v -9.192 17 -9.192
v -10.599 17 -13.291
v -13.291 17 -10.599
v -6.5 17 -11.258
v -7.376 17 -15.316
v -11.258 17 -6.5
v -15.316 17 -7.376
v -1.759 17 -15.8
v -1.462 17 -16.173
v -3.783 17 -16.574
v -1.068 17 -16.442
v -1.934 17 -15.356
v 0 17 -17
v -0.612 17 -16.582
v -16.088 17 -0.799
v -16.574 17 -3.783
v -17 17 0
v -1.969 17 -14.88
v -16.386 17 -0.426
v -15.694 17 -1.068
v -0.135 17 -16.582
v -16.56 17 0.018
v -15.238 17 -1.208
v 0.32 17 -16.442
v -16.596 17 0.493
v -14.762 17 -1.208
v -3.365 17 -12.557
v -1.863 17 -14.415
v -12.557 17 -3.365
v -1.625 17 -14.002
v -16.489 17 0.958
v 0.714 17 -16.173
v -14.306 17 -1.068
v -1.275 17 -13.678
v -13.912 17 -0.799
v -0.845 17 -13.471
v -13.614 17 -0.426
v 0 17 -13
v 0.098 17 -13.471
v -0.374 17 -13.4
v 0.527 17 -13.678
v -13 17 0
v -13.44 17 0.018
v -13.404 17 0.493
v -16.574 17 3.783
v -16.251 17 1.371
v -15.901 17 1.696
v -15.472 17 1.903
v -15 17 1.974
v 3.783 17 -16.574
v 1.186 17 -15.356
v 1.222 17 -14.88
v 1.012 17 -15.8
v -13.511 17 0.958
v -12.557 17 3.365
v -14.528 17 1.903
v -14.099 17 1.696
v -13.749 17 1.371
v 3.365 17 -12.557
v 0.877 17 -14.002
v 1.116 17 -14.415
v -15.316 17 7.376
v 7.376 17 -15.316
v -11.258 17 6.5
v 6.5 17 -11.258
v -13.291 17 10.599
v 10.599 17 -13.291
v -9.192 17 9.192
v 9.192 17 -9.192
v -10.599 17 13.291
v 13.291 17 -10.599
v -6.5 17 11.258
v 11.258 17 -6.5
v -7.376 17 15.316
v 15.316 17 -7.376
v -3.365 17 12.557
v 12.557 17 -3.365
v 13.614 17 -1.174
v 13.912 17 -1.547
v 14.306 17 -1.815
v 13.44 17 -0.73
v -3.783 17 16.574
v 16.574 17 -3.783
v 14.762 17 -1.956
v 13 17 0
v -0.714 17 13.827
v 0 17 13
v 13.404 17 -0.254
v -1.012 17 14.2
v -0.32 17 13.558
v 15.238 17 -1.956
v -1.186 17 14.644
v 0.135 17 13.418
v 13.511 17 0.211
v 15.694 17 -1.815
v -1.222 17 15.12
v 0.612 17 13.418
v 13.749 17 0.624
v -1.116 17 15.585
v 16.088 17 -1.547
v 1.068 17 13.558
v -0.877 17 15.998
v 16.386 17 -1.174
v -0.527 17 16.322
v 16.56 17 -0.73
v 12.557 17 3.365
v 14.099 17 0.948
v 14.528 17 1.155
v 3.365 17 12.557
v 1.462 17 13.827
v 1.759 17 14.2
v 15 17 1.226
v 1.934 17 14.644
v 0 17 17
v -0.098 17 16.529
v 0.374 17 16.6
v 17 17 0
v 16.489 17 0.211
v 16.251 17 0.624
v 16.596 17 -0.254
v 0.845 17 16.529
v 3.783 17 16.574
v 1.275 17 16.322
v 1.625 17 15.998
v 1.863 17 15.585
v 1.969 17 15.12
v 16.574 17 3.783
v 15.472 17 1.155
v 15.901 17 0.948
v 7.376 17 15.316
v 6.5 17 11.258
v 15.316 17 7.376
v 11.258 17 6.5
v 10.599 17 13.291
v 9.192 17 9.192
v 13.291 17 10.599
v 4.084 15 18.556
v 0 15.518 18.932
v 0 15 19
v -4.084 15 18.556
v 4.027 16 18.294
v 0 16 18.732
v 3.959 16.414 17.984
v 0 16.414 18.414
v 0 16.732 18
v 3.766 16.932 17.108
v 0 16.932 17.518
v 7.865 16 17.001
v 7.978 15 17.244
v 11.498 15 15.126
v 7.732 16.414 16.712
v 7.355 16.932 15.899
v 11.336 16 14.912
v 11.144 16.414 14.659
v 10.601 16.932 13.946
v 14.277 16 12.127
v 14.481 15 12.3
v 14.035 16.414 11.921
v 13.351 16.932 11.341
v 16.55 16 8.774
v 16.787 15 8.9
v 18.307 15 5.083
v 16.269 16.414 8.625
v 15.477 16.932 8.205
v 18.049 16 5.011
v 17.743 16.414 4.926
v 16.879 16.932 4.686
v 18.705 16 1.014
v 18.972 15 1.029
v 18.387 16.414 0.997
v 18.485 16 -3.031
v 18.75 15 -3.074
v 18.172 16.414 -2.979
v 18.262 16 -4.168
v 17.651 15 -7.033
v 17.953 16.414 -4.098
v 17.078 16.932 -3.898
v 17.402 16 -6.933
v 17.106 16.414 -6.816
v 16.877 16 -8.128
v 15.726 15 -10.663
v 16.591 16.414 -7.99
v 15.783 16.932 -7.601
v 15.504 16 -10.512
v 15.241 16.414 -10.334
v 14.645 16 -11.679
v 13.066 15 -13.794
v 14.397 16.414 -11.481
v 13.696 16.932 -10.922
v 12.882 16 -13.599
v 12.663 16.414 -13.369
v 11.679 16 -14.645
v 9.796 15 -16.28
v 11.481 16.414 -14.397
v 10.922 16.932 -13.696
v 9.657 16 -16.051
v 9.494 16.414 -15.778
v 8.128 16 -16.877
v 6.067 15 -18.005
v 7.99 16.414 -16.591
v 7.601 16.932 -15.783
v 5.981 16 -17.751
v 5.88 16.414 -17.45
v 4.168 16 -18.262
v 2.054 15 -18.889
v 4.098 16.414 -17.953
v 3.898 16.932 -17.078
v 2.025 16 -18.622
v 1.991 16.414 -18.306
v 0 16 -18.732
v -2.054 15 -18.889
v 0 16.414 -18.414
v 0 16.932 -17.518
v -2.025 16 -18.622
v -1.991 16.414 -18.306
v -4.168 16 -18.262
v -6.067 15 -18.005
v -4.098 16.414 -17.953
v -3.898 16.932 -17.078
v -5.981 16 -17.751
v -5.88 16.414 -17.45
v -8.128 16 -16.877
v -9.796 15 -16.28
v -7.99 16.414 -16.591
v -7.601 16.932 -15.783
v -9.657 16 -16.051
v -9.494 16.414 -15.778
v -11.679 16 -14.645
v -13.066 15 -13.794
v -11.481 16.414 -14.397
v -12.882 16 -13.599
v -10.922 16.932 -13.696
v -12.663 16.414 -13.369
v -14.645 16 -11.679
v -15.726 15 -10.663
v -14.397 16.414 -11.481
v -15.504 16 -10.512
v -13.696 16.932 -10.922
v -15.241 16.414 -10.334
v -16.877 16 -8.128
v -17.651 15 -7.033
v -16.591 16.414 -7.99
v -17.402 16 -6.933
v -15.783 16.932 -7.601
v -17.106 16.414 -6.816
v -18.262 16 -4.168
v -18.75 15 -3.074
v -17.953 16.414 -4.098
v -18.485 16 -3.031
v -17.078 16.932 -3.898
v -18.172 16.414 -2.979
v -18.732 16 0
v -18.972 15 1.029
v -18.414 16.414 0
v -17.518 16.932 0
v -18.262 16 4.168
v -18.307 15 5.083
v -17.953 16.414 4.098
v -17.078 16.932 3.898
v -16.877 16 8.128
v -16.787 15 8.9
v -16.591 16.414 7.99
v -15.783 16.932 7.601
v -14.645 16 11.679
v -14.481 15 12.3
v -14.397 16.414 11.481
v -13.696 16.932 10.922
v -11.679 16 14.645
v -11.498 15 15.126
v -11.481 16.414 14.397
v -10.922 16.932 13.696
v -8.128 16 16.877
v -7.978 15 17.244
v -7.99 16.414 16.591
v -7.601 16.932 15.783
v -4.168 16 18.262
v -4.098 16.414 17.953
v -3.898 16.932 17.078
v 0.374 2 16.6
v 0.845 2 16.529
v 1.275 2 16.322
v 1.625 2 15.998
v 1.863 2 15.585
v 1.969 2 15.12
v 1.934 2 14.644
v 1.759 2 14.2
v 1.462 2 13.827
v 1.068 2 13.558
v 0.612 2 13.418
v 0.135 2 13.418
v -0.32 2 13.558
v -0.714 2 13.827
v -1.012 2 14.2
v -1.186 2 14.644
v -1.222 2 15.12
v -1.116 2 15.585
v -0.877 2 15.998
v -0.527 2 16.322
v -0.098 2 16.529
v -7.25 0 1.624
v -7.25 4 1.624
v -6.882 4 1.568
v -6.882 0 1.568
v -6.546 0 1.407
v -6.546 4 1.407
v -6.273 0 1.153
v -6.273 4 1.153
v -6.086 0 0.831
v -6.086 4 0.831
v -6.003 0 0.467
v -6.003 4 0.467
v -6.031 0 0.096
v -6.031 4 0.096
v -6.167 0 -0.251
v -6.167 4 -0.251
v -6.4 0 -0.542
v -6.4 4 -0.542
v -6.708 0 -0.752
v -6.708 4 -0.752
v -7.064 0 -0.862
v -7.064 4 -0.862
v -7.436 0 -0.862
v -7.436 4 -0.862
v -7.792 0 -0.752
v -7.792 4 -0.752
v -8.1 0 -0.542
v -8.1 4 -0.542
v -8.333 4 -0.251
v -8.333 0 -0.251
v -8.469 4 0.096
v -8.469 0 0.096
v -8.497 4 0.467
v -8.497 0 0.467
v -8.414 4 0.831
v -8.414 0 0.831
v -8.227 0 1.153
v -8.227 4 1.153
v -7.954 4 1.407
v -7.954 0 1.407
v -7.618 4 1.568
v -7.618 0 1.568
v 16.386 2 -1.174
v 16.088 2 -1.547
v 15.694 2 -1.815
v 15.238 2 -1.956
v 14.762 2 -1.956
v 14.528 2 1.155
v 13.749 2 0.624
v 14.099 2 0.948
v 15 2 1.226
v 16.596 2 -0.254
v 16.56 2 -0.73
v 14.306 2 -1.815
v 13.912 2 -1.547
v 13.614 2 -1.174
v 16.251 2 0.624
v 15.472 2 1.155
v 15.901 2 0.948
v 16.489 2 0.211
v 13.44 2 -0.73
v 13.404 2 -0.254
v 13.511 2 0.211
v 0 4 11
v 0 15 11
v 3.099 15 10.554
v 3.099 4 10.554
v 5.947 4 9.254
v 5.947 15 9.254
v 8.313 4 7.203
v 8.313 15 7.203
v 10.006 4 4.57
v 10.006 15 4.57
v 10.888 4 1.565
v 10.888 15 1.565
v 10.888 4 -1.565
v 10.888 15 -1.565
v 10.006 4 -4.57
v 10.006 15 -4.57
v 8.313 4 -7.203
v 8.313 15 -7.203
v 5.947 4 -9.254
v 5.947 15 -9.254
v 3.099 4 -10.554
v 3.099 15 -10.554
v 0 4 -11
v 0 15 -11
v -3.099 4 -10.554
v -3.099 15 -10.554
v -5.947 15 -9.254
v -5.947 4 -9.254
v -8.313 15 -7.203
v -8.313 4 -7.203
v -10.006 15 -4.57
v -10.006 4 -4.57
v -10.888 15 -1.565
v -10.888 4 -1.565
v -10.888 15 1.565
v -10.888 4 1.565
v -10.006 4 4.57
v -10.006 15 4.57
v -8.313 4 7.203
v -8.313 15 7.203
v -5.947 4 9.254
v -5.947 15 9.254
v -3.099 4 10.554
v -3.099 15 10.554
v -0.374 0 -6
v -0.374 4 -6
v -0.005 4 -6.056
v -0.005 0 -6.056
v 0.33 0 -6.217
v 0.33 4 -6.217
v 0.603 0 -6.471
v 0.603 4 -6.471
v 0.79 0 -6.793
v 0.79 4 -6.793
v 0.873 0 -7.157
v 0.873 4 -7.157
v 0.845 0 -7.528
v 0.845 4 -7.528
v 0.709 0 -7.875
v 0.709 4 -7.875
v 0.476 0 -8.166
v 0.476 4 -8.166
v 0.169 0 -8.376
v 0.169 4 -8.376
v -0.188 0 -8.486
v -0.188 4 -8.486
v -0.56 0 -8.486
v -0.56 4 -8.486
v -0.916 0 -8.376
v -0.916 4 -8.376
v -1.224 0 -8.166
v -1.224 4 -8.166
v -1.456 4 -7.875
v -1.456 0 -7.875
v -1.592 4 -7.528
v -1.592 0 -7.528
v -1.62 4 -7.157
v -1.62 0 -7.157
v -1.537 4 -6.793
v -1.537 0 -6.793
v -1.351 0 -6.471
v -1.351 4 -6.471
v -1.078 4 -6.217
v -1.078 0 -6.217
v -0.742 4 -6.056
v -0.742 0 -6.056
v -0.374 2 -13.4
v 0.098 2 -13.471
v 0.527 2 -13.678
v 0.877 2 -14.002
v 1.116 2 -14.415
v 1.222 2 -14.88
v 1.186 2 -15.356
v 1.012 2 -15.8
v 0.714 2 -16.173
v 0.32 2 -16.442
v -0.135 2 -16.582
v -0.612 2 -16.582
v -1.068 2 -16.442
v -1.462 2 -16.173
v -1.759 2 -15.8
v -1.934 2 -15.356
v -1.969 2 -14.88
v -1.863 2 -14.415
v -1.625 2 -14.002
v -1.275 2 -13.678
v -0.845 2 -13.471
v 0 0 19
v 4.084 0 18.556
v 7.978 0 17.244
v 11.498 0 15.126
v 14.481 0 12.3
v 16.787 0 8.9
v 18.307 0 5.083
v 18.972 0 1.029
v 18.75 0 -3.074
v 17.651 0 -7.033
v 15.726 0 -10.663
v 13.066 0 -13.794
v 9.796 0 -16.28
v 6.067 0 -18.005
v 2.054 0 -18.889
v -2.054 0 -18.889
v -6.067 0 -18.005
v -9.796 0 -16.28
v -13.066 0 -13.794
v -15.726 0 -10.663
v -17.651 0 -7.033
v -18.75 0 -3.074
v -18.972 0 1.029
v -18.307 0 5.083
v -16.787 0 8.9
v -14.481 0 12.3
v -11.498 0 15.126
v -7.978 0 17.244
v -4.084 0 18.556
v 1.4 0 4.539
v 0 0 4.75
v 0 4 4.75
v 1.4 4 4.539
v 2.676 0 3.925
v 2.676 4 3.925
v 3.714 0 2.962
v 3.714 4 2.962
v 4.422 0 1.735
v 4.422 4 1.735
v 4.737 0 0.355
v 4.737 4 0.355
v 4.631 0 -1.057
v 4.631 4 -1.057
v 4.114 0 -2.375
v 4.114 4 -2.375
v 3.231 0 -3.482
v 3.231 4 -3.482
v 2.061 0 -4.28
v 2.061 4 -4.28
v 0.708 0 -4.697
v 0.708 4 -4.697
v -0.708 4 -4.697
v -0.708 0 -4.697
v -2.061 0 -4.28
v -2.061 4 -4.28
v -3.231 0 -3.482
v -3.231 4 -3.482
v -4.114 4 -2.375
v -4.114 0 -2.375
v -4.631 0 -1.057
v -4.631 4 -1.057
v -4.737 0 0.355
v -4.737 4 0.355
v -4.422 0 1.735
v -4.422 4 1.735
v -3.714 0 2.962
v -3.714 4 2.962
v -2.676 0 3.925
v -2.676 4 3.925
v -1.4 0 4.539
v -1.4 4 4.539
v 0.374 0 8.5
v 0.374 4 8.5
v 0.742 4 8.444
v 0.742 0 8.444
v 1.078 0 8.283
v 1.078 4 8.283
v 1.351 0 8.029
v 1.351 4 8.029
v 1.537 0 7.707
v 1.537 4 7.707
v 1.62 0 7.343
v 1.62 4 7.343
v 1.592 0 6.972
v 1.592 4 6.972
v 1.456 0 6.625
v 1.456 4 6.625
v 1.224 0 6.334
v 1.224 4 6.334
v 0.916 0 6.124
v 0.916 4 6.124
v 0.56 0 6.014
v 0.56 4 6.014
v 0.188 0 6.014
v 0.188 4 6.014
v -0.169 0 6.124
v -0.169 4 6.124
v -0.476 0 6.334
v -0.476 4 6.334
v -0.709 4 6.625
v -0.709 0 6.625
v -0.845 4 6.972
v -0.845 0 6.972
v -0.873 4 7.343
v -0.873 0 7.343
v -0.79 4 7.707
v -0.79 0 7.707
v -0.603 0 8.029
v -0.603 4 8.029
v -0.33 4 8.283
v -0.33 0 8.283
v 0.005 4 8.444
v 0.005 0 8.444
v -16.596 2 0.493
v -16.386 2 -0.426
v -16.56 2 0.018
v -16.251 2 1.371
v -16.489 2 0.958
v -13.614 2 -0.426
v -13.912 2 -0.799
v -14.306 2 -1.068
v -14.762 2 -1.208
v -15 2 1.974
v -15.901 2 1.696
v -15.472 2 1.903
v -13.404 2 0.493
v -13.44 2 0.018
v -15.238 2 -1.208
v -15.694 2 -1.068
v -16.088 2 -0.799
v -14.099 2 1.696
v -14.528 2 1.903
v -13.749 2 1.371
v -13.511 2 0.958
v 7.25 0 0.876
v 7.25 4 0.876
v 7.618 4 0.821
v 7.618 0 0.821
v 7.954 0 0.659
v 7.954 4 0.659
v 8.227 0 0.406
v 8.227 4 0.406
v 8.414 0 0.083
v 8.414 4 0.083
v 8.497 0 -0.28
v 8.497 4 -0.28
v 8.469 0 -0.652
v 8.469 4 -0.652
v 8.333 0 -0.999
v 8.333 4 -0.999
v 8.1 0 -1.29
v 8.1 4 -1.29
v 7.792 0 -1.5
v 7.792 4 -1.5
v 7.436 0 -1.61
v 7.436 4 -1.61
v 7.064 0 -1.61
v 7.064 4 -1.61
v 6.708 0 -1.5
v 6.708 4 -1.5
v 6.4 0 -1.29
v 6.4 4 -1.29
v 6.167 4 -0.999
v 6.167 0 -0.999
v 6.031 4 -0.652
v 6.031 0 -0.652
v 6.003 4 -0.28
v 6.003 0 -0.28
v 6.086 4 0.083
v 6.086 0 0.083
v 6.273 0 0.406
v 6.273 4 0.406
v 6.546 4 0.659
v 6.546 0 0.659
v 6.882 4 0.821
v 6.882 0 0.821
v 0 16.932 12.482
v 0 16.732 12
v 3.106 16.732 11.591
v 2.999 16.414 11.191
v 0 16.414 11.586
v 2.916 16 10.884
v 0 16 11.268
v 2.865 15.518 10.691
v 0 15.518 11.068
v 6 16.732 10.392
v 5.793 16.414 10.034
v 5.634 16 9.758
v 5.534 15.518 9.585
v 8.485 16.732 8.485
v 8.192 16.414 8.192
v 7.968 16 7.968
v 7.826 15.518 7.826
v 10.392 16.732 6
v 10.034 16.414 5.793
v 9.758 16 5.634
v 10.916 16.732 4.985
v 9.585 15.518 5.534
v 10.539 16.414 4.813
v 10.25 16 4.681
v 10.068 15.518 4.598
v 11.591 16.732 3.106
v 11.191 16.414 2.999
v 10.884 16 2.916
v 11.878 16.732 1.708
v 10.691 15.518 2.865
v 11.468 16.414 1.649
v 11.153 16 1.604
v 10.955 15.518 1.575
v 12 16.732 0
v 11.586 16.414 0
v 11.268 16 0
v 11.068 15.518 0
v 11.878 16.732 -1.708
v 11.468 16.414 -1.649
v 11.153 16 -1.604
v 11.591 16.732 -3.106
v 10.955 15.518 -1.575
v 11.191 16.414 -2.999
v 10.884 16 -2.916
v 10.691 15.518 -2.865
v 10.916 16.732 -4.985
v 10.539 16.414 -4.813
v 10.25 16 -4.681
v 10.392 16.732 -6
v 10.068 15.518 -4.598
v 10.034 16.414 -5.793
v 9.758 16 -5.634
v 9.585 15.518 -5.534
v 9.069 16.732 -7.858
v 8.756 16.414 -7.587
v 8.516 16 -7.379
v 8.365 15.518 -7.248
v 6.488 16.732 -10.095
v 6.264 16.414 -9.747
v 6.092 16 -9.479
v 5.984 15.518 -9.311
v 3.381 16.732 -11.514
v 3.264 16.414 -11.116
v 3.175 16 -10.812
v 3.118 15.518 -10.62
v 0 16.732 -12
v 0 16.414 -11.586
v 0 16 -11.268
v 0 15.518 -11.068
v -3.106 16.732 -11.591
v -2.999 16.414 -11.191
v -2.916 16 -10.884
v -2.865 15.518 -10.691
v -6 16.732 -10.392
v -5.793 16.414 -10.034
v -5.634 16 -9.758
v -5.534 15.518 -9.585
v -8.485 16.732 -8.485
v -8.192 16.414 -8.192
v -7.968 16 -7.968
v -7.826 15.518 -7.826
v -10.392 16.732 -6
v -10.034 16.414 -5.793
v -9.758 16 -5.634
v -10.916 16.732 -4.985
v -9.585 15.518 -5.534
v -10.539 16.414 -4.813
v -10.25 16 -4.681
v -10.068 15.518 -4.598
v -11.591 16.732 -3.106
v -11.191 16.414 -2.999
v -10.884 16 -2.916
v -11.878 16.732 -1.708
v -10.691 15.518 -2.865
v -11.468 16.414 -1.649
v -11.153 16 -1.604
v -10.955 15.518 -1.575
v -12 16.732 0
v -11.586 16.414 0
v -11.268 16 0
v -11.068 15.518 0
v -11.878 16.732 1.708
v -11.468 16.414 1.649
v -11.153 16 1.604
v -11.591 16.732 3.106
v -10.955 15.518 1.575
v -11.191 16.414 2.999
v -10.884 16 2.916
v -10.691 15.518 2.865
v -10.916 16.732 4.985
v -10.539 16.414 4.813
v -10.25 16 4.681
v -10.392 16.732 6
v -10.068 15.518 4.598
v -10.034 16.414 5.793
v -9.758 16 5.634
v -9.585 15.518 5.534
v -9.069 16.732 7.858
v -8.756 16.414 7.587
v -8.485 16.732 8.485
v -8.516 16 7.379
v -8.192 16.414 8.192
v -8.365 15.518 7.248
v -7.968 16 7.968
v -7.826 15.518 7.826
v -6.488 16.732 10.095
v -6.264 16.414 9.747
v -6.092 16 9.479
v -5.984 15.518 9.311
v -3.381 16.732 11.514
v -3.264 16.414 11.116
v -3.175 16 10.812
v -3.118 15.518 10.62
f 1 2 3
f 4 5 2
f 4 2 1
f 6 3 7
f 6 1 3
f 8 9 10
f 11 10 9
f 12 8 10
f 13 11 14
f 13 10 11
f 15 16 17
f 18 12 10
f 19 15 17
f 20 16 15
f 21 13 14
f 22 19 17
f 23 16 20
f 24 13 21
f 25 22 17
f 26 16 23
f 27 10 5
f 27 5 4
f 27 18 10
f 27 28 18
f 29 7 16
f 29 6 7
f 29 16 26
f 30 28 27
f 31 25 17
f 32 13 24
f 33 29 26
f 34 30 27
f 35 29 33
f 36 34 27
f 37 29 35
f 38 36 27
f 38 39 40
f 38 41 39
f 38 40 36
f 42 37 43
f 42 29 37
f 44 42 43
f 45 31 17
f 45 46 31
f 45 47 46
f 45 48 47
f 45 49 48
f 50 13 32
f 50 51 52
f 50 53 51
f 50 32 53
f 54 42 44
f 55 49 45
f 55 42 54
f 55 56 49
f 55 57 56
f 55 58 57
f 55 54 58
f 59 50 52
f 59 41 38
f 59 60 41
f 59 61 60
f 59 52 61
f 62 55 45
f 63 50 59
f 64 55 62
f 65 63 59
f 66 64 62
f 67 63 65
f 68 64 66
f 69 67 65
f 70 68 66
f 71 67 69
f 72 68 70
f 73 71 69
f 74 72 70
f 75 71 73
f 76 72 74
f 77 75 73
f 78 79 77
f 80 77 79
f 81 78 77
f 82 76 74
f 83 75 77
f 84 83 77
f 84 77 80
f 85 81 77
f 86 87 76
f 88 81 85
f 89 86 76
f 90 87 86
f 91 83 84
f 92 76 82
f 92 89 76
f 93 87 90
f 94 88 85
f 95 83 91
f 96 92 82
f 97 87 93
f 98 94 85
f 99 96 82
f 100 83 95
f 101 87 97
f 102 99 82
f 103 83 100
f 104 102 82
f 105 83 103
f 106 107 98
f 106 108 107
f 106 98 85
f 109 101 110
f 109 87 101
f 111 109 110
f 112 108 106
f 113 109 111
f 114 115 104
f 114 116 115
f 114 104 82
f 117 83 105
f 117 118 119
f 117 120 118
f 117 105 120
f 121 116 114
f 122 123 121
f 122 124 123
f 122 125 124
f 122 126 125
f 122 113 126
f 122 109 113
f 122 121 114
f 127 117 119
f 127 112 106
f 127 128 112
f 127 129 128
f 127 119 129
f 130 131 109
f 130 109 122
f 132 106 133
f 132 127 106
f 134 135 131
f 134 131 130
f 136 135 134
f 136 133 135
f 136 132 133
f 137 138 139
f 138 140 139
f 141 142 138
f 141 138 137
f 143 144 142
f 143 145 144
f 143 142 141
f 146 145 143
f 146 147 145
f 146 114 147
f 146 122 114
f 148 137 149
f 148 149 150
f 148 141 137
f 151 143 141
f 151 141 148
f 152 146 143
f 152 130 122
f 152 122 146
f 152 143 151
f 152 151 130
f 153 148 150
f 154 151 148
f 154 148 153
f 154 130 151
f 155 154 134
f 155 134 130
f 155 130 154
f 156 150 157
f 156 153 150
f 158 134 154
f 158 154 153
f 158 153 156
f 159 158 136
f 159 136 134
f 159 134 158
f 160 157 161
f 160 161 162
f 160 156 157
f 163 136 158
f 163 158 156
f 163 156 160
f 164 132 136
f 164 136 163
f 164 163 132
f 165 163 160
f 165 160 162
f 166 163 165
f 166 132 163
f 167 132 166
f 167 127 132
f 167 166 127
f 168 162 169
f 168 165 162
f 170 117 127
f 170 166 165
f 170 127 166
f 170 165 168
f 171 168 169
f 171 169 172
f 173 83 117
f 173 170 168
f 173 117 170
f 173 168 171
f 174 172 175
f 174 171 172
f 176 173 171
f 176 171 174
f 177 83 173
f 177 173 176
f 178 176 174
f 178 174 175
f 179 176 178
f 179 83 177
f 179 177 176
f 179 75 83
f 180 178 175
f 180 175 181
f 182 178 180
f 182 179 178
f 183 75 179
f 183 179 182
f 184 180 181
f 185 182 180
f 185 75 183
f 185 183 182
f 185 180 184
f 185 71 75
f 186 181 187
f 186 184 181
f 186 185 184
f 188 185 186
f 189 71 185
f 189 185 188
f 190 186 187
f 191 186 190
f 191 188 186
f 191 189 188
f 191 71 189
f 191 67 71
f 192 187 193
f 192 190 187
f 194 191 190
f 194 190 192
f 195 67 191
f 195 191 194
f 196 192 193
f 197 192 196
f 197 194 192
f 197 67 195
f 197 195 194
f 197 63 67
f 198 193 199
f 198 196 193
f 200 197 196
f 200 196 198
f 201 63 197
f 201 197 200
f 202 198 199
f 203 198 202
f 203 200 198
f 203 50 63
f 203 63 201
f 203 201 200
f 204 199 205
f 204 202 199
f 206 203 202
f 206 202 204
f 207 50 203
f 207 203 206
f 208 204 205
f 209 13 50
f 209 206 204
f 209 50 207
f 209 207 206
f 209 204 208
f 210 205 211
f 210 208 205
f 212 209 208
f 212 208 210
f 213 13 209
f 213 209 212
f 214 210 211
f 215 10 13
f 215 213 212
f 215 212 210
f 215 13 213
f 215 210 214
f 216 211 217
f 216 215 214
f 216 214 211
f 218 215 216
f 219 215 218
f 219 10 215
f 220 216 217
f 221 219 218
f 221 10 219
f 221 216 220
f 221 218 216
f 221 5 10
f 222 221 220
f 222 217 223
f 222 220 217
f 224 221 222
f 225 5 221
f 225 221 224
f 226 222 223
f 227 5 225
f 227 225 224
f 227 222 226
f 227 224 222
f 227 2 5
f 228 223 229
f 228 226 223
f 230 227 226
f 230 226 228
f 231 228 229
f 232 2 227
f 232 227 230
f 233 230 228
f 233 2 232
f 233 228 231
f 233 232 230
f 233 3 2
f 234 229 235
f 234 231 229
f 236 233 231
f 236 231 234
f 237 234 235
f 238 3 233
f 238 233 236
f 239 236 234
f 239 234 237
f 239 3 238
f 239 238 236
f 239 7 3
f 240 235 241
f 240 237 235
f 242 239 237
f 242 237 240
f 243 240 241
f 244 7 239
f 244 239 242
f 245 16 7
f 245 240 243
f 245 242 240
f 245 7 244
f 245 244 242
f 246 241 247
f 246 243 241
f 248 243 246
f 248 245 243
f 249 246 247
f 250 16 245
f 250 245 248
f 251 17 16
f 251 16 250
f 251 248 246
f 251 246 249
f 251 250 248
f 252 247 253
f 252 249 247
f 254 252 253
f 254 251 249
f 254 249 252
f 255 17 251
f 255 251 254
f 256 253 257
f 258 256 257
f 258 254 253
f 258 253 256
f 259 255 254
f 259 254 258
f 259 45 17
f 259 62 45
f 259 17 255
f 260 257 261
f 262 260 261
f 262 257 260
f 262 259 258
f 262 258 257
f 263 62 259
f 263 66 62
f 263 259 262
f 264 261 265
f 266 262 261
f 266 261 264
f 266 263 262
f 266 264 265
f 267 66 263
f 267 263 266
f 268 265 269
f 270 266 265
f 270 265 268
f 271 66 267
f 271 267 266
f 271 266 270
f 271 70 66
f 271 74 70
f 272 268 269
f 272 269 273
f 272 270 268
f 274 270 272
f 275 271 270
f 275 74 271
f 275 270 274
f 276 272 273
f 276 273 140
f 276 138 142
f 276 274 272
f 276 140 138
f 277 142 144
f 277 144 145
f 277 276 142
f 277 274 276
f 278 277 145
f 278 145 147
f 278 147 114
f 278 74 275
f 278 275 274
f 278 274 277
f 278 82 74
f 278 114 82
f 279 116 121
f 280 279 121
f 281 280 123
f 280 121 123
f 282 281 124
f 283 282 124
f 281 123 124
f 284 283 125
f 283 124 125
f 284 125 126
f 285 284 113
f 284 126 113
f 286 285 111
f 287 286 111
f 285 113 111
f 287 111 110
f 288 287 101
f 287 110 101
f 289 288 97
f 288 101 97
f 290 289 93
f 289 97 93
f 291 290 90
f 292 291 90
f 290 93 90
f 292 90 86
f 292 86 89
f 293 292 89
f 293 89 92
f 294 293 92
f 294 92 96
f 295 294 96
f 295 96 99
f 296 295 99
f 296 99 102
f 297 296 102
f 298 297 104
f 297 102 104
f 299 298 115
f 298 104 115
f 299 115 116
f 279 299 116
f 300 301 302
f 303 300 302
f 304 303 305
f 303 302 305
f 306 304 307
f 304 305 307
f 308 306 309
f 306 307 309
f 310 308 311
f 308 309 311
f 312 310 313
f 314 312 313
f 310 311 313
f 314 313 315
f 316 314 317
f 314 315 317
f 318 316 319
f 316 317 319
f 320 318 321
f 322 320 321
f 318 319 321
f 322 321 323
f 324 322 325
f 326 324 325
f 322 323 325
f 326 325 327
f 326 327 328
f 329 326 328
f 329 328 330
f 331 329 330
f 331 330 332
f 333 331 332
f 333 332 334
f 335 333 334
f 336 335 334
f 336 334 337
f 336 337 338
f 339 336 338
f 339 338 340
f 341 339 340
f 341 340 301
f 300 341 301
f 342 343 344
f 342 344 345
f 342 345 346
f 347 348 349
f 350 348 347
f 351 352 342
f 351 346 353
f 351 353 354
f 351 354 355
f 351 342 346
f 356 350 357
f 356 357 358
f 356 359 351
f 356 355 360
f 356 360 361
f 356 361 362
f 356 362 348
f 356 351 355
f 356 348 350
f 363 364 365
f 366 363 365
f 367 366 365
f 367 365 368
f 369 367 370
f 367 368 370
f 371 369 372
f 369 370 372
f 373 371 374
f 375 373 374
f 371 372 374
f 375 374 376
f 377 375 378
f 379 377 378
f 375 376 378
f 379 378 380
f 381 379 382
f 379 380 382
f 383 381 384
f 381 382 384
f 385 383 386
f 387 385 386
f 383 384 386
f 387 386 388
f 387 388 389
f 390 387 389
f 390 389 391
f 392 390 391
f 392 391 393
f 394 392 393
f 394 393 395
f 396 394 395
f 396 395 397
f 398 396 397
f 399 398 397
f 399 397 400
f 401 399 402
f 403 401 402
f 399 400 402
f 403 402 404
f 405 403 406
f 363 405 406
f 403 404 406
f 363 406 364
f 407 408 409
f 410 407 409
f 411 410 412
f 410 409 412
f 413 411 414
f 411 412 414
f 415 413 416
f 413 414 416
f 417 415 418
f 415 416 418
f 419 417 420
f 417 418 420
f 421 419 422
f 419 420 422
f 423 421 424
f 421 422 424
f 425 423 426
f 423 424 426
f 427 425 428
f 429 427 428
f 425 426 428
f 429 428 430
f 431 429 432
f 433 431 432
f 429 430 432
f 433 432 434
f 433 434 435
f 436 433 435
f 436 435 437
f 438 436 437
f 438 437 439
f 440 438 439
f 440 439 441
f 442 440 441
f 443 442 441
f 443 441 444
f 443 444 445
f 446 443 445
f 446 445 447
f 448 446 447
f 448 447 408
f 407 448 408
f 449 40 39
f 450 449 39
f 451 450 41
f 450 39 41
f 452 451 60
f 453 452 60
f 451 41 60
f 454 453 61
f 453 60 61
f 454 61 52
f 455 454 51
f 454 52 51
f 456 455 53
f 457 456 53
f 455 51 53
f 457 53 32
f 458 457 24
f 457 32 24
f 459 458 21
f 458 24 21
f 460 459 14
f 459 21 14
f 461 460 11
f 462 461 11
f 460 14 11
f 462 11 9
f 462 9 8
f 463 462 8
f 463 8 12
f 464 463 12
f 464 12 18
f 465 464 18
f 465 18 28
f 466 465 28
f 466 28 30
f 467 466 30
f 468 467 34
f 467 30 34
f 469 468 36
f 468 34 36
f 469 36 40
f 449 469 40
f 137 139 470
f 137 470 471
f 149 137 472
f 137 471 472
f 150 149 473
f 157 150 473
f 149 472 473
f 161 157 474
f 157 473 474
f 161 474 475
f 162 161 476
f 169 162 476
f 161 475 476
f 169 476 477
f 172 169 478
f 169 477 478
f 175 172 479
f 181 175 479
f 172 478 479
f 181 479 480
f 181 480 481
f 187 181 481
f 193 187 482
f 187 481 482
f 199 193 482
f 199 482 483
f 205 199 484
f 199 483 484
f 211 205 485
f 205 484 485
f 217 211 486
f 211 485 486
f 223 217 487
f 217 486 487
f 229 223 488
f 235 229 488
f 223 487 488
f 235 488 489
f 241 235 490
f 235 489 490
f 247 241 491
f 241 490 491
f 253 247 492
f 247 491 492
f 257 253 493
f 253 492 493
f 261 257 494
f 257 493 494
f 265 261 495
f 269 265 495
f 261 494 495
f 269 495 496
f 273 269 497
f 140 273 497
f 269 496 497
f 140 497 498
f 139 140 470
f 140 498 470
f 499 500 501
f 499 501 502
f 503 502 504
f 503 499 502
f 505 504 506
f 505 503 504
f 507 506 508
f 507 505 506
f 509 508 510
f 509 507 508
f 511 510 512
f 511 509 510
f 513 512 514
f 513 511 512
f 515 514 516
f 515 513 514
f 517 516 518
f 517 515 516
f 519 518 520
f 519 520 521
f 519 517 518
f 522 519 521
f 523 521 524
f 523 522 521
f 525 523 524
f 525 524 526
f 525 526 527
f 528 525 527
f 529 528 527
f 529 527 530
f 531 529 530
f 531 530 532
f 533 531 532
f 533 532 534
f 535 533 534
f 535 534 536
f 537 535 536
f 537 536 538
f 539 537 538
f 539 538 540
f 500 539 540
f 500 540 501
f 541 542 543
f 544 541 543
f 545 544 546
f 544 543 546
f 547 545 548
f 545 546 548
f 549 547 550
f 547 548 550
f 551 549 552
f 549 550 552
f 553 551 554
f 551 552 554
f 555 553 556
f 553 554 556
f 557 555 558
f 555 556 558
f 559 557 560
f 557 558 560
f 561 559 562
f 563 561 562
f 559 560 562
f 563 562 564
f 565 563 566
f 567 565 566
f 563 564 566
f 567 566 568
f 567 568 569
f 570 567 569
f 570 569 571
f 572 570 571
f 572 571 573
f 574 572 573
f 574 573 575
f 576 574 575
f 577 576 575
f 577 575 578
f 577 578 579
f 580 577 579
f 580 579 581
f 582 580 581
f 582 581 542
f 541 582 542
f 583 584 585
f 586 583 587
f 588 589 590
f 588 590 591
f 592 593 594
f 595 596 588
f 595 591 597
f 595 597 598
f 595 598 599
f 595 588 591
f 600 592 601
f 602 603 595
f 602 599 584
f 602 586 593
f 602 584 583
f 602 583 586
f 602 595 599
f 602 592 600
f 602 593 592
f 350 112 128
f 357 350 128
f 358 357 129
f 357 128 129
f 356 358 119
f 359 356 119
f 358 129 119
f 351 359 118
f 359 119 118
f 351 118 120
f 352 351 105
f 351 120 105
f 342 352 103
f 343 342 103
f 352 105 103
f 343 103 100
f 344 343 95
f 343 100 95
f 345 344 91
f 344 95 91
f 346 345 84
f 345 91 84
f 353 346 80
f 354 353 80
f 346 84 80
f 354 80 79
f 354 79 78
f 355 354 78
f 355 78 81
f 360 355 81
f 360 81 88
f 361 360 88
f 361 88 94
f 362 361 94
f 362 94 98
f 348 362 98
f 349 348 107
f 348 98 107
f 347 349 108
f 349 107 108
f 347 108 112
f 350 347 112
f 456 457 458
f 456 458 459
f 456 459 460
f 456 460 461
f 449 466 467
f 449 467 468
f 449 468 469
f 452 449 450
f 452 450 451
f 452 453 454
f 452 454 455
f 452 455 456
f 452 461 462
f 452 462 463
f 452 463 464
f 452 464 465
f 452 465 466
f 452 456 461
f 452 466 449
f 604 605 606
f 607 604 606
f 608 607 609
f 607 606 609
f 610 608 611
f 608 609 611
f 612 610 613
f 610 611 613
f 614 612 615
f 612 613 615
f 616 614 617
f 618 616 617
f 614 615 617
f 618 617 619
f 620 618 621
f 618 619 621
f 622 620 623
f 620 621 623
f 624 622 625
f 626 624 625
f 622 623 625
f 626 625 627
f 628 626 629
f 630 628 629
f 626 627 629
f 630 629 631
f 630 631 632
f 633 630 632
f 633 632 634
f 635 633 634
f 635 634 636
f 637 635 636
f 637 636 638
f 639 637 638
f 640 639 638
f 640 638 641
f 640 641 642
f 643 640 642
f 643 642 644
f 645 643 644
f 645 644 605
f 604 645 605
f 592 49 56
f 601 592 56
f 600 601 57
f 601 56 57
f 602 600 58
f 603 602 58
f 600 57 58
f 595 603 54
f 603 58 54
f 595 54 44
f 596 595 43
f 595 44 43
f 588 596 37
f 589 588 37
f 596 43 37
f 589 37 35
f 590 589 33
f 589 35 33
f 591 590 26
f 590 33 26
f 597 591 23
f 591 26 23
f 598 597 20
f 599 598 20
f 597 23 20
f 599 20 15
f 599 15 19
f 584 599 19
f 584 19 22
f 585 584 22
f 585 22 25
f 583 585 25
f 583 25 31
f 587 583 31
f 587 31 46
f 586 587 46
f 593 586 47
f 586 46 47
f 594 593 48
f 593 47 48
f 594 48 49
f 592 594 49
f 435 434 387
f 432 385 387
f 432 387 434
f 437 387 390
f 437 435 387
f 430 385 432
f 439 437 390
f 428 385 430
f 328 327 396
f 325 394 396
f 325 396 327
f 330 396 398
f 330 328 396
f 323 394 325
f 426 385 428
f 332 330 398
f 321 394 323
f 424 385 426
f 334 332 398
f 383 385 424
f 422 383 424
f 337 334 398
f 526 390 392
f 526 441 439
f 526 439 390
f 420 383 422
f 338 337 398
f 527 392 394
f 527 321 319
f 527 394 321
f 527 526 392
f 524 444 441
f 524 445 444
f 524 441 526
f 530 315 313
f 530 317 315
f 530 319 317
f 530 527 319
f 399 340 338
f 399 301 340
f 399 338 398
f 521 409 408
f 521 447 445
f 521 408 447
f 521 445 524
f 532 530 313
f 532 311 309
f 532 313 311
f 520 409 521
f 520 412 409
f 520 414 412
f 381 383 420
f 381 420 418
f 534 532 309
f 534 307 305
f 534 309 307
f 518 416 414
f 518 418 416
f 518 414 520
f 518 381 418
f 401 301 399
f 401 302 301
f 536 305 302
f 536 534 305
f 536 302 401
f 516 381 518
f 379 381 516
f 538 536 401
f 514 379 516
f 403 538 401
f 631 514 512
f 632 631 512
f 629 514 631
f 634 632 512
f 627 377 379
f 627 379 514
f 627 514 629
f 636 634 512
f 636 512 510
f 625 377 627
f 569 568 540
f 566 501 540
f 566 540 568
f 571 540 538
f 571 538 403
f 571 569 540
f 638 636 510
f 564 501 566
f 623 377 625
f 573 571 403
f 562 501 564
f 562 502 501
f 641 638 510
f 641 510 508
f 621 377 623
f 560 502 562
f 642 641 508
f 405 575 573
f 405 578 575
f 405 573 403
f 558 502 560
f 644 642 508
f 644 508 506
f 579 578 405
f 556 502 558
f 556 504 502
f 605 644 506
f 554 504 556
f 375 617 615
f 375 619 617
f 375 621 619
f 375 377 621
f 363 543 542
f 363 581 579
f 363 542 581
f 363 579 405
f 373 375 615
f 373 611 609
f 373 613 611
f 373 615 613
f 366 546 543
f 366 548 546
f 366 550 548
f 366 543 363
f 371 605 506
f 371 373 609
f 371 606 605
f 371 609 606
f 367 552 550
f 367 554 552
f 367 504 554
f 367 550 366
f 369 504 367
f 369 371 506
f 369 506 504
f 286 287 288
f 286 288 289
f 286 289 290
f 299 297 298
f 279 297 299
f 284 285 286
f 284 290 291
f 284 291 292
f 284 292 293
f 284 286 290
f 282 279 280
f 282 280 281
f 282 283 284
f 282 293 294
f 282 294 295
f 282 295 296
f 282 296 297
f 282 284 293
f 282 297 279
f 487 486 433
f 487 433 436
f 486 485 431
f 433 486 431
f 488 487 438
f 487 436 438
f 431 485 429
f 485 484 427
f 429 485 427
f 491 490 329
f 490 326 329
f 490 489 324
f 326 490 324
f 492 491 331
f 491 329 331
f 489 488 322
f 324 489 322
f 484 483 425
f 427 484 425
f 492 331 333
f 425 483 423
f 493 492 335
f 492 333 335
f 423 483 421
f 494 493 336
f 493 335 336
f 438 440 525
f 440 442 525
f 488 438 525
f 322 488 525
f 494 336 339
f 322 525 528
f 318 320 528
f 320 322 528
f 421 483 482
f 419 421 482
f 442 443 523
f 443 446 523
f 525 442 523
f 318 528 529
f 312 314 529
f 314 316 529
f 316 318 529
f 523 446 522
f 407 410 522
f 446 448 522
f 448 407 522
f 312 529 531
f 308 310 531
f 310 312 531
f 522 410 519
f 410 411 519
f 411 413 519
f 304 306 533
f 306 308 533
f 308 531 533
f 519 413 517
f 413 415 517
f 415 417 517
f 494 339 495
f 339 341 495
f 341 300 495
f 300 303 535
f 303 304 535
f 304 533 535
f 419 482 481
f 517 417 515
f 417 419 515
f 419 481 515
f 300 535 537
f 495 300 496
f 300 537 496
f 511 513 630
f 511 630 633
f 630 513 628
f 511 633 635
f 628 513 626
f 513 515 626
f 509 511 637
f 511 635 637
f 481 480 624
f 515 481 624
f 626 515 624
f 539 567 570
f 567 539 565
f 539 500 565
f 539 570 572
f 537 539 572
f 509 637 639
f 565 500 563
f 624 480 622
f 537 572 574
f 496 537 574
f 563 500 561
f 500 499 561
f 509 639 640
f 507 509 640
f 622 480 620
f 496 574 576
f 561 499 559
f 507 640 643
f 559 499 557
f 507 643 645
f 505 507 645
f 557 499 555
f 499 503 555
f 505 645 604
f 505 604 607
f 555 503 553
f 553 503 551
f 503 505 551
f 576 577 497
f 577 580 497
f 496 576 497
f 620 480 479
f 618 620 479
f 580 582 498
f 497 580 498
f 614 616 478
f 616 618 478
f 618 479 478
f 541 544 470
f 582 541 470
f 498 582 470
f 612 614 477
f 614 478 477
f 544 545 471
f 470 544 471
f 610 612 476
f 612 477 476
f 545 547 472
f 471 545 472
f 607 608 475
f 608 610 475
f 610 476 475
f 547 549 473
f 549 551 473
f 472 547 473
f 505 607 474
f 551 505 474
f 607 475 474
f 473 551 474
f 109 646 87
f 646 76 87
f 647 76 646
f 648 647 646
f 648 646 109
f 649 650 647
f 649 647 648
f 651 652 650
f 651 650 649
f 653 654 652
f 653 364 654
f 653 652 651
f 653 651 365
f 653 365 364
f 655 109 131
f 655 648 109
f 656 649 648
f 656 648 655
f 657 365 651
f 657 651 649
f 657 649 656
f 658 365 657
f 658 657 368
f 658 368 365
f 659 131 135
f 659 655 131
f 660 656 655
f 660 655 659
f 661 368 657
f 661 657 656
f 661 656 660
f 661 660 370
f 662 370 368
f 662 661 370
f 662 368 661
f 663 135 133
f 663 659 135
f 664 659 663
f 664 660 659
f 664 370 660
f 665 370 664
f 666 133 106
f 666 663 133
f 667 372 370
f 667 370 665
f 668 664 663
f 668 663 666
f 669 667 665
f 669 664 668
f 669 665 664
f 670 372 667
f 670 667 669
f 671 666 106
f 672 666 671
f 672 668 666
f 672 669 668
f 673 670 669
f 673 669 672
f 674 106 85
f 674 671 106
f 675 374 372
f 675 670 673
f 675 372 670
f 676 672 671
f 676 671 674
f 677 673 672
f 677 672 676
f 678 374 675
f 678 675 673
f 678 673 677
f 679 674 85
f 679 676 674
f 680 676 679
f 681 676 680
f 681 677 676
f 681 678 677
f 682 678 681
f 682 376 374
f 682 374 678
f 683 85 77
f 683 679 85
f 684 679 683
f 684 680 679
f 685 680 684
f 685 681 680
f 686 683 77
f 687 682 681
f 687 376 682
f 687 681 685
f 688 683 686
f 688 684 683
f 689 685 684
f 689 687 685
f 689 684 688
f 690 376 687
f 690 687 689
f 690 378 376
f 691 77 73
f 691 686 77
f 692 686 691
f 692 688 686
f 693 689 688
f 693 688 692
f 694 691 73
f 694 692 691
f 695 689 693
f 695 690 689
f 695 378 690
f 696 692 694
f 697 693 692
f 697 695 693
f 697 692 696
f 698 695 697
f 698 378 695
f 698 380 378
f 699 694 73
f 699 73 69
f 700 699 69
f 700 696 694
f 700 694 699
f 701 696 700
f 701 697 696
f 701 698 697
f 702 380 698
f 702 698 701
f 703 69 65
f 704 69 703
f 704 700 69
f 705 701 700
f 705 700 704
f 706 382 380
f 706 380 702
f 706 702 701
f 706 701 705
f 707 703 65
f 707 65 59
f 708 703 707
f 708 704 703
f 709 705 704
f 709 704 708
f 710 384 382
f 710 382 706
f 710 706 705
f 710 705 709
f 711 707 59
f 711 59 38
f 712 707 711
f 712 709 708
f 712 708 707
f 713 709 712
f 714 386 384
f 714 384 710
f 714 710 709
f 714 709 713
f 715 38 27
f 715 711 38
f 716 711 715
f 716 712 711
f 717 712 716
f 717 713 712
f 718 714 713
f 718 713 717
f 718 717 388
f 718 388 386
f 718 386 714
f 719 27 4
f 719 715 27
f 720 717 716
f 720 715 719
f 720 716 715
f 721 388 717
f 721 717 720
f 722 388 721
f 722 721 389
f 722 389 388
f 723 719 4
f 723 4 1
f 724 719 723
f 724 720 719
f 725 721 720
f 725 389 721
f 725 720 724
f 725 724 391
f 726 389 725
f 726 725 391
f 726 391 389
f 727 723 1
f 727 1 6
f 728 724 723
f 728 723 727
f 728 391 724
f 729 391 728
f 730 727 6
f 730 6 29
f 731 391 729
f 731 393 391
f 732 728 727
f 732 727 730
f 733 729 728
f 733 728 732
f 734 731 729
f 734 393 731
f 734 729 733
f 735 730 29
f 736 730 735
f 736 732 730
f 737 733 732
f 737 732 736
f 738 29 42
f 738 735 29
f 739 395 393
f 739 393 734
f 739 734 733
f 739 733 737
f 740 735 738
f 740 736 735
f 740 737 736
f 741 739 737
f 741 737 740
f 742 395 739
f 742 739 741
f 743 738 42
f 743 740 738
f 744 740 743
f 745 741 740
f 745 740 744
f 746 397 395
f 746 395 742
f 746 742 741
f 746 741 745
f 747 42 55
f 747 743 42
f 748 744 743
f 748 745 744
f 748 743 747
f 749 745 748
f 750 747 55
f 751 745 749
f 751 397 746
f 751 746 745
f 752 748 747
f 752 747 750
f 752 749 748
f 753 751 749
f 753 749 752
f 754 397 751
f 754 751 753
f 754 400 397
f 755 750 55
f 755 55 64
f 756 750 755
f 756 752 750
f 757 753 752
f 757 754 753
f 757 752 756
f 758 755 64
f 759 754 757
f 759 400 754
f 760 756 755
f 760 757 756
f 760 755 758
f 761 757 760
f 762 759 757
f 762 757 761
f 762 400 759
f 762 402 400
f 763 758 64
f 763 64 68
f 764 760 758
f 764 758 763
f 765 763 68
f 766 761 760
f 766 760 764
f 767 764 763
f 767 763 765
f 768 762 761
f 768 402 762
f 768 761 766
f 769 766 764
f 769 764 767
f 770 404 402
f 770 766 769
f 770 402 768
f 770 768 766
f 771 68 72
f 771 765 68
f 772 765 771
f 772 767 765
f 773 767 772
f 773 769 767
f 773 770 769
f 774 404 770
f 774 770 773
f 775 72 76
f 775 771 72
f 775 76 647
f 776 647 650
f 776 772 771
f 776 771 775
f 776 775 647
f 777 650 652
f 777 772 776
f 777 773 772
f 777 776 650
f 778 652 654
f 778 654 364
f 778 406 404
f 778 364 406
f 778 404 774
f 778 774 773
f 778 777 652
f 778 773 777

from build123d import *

# Parameters (mm, degrees)
SKETCH1_R           = 19
SKETCH1_R_2         = 4.75
BOSS_EXTRUDE1_DEPTH = 17
SKETCH2_R           = 1.25
CUT_EXTRUDE1_DEPTH  = 32.796226191
SKETCH3_R           = 1.6
CUT_EXTRUDE2_DEPTH  = 15
SKETCH4_R           = 11
SKETCH4_R_2         = 1.25
SKETCH4_R_3         = 4.75
CUT_EXTRUDE4_DEPTH  = 13
FILLET3_R           = 2


with BuildPart() as part:
    # Sketch1 → Boss-Extrude1 (new body)
    with BuildSketch(Plane(origin=(0, 0, 0), x_dir=(1, 0, 0), z_dir=(0, 1, 0))):
        with Locations(Location((0, 0, 0), (0, 0, 270))):
            Circle(SKETCH1_R)
        with Locations(Location((0, 0, 0), (0, 0, 270))):
            Circle(SKETCH1_R_2, mode=Mode.SUBTRACT)
    extrude(amount=BOSS_EXTRUDE1_DEPTH)

    # Sketch2 → Cut-Extrude1 (cut, through all)
    with BuildSketch(Plane(origin=(0, 17, 0), x_dir=(1, 0, 0), z_dir=(0, 1, 0))):
        with Locations(Location((-0.373838074, 7.25, 0), (0, 0, 270))):
            Circle(SKETCH2_R)
        with Locations(Location((7.25, 0.373838074, 0), (0, 0, 270))):
            Circle(SKETCH2_R)
        with Locations(Location((0.373838074, -7.25, 0), (0, 0, 270))):
            Circle(SKETCH2_R)
        with Locations(Location((-7.25, -0.373838074, 0), (0, 0, 270))):
            Circle(SKETCH2_R)
    extrude(amount=-CUT_EXTRUDE1_DEPTH, mode=Mode.SUBTRACT)

    # Sketch3 → Cut-Extrude2 (cut)
    with BuildSketch(Plane(origin=(0, 17, 0), x_dir=(1, 0, 0), z_dir=(0, 1, 0))):
        with Locations(Location((-0.373838074, 15, 0), (0, 0, 270))):
            Circle(SKETCH3_R)
        with Locations(Location((15, 0.373838074, 0), (0, 0, 270))):
            Circle(SKETCH3_R)
        with Locations(Location((0.373838074, -15, 0), (0, 0, 270))):
            Circle(SKETCH3_R)
        with Locations(Location((-15, -0.373838074, 0), (0, 0, 270))):
            Circle(SKETCH3_R)
    extrude(amount=-CUT_EXTRUDE2_DEPTH, mode=Mode.SUBTRACT)

    # Sketch4 → Cut-Extrude4 (cut)
    with BuildSketch(Plane(origin=(0, 17, 0), x_dir=(1, 0, 0), z_dir=(0, 1, 0))):
        with Locations(Location((0, 0, 0), (0, 0, 270))):
            Circle(SKETCH4_R)
        with Locations(Location((-0.373838074, 7.25, 0), (0, 0, 270))):
            Circle(SKETCH4_R_2, mode=Mode.SUBTRACT)
        with Locations(Location((0.373838074, -7.25, 0), (0, 0, 270))):
            Circle(SKETCH4_R_2, mode=Mode.SUBTRACT)
        with Locations(Location((0, 0, 0), (0, 0, 270))):
            Circle(SKETCH4_R_3, mode=Mode.SUBTRACT)
        with Locations(Location((-7.25, -0.373838074, 0), (0, 0, 270))):
            Circle(SKETCH4_R_2, mode=Mode.SUBTRACT)
        with Locations(Location((7.25, 0.373838074, 0), (0, 0, 270))):
            Circle(SKETCH4_R_2, mode=Mode.SUBTRACT)
    extrude(amount=-CUT_EXTRUDE4_DEPTH, mode=Mode.SUBTRACT)

    # Fillet3
    fillet3_edges = [part.edges().sort_by_distance(p)[0] for p in [
        (0, 17, -11),
        (0, 17, -19),
    ]]
    fillet(fillet3_edges, radius=FILLET3_R)


solid = part.part
